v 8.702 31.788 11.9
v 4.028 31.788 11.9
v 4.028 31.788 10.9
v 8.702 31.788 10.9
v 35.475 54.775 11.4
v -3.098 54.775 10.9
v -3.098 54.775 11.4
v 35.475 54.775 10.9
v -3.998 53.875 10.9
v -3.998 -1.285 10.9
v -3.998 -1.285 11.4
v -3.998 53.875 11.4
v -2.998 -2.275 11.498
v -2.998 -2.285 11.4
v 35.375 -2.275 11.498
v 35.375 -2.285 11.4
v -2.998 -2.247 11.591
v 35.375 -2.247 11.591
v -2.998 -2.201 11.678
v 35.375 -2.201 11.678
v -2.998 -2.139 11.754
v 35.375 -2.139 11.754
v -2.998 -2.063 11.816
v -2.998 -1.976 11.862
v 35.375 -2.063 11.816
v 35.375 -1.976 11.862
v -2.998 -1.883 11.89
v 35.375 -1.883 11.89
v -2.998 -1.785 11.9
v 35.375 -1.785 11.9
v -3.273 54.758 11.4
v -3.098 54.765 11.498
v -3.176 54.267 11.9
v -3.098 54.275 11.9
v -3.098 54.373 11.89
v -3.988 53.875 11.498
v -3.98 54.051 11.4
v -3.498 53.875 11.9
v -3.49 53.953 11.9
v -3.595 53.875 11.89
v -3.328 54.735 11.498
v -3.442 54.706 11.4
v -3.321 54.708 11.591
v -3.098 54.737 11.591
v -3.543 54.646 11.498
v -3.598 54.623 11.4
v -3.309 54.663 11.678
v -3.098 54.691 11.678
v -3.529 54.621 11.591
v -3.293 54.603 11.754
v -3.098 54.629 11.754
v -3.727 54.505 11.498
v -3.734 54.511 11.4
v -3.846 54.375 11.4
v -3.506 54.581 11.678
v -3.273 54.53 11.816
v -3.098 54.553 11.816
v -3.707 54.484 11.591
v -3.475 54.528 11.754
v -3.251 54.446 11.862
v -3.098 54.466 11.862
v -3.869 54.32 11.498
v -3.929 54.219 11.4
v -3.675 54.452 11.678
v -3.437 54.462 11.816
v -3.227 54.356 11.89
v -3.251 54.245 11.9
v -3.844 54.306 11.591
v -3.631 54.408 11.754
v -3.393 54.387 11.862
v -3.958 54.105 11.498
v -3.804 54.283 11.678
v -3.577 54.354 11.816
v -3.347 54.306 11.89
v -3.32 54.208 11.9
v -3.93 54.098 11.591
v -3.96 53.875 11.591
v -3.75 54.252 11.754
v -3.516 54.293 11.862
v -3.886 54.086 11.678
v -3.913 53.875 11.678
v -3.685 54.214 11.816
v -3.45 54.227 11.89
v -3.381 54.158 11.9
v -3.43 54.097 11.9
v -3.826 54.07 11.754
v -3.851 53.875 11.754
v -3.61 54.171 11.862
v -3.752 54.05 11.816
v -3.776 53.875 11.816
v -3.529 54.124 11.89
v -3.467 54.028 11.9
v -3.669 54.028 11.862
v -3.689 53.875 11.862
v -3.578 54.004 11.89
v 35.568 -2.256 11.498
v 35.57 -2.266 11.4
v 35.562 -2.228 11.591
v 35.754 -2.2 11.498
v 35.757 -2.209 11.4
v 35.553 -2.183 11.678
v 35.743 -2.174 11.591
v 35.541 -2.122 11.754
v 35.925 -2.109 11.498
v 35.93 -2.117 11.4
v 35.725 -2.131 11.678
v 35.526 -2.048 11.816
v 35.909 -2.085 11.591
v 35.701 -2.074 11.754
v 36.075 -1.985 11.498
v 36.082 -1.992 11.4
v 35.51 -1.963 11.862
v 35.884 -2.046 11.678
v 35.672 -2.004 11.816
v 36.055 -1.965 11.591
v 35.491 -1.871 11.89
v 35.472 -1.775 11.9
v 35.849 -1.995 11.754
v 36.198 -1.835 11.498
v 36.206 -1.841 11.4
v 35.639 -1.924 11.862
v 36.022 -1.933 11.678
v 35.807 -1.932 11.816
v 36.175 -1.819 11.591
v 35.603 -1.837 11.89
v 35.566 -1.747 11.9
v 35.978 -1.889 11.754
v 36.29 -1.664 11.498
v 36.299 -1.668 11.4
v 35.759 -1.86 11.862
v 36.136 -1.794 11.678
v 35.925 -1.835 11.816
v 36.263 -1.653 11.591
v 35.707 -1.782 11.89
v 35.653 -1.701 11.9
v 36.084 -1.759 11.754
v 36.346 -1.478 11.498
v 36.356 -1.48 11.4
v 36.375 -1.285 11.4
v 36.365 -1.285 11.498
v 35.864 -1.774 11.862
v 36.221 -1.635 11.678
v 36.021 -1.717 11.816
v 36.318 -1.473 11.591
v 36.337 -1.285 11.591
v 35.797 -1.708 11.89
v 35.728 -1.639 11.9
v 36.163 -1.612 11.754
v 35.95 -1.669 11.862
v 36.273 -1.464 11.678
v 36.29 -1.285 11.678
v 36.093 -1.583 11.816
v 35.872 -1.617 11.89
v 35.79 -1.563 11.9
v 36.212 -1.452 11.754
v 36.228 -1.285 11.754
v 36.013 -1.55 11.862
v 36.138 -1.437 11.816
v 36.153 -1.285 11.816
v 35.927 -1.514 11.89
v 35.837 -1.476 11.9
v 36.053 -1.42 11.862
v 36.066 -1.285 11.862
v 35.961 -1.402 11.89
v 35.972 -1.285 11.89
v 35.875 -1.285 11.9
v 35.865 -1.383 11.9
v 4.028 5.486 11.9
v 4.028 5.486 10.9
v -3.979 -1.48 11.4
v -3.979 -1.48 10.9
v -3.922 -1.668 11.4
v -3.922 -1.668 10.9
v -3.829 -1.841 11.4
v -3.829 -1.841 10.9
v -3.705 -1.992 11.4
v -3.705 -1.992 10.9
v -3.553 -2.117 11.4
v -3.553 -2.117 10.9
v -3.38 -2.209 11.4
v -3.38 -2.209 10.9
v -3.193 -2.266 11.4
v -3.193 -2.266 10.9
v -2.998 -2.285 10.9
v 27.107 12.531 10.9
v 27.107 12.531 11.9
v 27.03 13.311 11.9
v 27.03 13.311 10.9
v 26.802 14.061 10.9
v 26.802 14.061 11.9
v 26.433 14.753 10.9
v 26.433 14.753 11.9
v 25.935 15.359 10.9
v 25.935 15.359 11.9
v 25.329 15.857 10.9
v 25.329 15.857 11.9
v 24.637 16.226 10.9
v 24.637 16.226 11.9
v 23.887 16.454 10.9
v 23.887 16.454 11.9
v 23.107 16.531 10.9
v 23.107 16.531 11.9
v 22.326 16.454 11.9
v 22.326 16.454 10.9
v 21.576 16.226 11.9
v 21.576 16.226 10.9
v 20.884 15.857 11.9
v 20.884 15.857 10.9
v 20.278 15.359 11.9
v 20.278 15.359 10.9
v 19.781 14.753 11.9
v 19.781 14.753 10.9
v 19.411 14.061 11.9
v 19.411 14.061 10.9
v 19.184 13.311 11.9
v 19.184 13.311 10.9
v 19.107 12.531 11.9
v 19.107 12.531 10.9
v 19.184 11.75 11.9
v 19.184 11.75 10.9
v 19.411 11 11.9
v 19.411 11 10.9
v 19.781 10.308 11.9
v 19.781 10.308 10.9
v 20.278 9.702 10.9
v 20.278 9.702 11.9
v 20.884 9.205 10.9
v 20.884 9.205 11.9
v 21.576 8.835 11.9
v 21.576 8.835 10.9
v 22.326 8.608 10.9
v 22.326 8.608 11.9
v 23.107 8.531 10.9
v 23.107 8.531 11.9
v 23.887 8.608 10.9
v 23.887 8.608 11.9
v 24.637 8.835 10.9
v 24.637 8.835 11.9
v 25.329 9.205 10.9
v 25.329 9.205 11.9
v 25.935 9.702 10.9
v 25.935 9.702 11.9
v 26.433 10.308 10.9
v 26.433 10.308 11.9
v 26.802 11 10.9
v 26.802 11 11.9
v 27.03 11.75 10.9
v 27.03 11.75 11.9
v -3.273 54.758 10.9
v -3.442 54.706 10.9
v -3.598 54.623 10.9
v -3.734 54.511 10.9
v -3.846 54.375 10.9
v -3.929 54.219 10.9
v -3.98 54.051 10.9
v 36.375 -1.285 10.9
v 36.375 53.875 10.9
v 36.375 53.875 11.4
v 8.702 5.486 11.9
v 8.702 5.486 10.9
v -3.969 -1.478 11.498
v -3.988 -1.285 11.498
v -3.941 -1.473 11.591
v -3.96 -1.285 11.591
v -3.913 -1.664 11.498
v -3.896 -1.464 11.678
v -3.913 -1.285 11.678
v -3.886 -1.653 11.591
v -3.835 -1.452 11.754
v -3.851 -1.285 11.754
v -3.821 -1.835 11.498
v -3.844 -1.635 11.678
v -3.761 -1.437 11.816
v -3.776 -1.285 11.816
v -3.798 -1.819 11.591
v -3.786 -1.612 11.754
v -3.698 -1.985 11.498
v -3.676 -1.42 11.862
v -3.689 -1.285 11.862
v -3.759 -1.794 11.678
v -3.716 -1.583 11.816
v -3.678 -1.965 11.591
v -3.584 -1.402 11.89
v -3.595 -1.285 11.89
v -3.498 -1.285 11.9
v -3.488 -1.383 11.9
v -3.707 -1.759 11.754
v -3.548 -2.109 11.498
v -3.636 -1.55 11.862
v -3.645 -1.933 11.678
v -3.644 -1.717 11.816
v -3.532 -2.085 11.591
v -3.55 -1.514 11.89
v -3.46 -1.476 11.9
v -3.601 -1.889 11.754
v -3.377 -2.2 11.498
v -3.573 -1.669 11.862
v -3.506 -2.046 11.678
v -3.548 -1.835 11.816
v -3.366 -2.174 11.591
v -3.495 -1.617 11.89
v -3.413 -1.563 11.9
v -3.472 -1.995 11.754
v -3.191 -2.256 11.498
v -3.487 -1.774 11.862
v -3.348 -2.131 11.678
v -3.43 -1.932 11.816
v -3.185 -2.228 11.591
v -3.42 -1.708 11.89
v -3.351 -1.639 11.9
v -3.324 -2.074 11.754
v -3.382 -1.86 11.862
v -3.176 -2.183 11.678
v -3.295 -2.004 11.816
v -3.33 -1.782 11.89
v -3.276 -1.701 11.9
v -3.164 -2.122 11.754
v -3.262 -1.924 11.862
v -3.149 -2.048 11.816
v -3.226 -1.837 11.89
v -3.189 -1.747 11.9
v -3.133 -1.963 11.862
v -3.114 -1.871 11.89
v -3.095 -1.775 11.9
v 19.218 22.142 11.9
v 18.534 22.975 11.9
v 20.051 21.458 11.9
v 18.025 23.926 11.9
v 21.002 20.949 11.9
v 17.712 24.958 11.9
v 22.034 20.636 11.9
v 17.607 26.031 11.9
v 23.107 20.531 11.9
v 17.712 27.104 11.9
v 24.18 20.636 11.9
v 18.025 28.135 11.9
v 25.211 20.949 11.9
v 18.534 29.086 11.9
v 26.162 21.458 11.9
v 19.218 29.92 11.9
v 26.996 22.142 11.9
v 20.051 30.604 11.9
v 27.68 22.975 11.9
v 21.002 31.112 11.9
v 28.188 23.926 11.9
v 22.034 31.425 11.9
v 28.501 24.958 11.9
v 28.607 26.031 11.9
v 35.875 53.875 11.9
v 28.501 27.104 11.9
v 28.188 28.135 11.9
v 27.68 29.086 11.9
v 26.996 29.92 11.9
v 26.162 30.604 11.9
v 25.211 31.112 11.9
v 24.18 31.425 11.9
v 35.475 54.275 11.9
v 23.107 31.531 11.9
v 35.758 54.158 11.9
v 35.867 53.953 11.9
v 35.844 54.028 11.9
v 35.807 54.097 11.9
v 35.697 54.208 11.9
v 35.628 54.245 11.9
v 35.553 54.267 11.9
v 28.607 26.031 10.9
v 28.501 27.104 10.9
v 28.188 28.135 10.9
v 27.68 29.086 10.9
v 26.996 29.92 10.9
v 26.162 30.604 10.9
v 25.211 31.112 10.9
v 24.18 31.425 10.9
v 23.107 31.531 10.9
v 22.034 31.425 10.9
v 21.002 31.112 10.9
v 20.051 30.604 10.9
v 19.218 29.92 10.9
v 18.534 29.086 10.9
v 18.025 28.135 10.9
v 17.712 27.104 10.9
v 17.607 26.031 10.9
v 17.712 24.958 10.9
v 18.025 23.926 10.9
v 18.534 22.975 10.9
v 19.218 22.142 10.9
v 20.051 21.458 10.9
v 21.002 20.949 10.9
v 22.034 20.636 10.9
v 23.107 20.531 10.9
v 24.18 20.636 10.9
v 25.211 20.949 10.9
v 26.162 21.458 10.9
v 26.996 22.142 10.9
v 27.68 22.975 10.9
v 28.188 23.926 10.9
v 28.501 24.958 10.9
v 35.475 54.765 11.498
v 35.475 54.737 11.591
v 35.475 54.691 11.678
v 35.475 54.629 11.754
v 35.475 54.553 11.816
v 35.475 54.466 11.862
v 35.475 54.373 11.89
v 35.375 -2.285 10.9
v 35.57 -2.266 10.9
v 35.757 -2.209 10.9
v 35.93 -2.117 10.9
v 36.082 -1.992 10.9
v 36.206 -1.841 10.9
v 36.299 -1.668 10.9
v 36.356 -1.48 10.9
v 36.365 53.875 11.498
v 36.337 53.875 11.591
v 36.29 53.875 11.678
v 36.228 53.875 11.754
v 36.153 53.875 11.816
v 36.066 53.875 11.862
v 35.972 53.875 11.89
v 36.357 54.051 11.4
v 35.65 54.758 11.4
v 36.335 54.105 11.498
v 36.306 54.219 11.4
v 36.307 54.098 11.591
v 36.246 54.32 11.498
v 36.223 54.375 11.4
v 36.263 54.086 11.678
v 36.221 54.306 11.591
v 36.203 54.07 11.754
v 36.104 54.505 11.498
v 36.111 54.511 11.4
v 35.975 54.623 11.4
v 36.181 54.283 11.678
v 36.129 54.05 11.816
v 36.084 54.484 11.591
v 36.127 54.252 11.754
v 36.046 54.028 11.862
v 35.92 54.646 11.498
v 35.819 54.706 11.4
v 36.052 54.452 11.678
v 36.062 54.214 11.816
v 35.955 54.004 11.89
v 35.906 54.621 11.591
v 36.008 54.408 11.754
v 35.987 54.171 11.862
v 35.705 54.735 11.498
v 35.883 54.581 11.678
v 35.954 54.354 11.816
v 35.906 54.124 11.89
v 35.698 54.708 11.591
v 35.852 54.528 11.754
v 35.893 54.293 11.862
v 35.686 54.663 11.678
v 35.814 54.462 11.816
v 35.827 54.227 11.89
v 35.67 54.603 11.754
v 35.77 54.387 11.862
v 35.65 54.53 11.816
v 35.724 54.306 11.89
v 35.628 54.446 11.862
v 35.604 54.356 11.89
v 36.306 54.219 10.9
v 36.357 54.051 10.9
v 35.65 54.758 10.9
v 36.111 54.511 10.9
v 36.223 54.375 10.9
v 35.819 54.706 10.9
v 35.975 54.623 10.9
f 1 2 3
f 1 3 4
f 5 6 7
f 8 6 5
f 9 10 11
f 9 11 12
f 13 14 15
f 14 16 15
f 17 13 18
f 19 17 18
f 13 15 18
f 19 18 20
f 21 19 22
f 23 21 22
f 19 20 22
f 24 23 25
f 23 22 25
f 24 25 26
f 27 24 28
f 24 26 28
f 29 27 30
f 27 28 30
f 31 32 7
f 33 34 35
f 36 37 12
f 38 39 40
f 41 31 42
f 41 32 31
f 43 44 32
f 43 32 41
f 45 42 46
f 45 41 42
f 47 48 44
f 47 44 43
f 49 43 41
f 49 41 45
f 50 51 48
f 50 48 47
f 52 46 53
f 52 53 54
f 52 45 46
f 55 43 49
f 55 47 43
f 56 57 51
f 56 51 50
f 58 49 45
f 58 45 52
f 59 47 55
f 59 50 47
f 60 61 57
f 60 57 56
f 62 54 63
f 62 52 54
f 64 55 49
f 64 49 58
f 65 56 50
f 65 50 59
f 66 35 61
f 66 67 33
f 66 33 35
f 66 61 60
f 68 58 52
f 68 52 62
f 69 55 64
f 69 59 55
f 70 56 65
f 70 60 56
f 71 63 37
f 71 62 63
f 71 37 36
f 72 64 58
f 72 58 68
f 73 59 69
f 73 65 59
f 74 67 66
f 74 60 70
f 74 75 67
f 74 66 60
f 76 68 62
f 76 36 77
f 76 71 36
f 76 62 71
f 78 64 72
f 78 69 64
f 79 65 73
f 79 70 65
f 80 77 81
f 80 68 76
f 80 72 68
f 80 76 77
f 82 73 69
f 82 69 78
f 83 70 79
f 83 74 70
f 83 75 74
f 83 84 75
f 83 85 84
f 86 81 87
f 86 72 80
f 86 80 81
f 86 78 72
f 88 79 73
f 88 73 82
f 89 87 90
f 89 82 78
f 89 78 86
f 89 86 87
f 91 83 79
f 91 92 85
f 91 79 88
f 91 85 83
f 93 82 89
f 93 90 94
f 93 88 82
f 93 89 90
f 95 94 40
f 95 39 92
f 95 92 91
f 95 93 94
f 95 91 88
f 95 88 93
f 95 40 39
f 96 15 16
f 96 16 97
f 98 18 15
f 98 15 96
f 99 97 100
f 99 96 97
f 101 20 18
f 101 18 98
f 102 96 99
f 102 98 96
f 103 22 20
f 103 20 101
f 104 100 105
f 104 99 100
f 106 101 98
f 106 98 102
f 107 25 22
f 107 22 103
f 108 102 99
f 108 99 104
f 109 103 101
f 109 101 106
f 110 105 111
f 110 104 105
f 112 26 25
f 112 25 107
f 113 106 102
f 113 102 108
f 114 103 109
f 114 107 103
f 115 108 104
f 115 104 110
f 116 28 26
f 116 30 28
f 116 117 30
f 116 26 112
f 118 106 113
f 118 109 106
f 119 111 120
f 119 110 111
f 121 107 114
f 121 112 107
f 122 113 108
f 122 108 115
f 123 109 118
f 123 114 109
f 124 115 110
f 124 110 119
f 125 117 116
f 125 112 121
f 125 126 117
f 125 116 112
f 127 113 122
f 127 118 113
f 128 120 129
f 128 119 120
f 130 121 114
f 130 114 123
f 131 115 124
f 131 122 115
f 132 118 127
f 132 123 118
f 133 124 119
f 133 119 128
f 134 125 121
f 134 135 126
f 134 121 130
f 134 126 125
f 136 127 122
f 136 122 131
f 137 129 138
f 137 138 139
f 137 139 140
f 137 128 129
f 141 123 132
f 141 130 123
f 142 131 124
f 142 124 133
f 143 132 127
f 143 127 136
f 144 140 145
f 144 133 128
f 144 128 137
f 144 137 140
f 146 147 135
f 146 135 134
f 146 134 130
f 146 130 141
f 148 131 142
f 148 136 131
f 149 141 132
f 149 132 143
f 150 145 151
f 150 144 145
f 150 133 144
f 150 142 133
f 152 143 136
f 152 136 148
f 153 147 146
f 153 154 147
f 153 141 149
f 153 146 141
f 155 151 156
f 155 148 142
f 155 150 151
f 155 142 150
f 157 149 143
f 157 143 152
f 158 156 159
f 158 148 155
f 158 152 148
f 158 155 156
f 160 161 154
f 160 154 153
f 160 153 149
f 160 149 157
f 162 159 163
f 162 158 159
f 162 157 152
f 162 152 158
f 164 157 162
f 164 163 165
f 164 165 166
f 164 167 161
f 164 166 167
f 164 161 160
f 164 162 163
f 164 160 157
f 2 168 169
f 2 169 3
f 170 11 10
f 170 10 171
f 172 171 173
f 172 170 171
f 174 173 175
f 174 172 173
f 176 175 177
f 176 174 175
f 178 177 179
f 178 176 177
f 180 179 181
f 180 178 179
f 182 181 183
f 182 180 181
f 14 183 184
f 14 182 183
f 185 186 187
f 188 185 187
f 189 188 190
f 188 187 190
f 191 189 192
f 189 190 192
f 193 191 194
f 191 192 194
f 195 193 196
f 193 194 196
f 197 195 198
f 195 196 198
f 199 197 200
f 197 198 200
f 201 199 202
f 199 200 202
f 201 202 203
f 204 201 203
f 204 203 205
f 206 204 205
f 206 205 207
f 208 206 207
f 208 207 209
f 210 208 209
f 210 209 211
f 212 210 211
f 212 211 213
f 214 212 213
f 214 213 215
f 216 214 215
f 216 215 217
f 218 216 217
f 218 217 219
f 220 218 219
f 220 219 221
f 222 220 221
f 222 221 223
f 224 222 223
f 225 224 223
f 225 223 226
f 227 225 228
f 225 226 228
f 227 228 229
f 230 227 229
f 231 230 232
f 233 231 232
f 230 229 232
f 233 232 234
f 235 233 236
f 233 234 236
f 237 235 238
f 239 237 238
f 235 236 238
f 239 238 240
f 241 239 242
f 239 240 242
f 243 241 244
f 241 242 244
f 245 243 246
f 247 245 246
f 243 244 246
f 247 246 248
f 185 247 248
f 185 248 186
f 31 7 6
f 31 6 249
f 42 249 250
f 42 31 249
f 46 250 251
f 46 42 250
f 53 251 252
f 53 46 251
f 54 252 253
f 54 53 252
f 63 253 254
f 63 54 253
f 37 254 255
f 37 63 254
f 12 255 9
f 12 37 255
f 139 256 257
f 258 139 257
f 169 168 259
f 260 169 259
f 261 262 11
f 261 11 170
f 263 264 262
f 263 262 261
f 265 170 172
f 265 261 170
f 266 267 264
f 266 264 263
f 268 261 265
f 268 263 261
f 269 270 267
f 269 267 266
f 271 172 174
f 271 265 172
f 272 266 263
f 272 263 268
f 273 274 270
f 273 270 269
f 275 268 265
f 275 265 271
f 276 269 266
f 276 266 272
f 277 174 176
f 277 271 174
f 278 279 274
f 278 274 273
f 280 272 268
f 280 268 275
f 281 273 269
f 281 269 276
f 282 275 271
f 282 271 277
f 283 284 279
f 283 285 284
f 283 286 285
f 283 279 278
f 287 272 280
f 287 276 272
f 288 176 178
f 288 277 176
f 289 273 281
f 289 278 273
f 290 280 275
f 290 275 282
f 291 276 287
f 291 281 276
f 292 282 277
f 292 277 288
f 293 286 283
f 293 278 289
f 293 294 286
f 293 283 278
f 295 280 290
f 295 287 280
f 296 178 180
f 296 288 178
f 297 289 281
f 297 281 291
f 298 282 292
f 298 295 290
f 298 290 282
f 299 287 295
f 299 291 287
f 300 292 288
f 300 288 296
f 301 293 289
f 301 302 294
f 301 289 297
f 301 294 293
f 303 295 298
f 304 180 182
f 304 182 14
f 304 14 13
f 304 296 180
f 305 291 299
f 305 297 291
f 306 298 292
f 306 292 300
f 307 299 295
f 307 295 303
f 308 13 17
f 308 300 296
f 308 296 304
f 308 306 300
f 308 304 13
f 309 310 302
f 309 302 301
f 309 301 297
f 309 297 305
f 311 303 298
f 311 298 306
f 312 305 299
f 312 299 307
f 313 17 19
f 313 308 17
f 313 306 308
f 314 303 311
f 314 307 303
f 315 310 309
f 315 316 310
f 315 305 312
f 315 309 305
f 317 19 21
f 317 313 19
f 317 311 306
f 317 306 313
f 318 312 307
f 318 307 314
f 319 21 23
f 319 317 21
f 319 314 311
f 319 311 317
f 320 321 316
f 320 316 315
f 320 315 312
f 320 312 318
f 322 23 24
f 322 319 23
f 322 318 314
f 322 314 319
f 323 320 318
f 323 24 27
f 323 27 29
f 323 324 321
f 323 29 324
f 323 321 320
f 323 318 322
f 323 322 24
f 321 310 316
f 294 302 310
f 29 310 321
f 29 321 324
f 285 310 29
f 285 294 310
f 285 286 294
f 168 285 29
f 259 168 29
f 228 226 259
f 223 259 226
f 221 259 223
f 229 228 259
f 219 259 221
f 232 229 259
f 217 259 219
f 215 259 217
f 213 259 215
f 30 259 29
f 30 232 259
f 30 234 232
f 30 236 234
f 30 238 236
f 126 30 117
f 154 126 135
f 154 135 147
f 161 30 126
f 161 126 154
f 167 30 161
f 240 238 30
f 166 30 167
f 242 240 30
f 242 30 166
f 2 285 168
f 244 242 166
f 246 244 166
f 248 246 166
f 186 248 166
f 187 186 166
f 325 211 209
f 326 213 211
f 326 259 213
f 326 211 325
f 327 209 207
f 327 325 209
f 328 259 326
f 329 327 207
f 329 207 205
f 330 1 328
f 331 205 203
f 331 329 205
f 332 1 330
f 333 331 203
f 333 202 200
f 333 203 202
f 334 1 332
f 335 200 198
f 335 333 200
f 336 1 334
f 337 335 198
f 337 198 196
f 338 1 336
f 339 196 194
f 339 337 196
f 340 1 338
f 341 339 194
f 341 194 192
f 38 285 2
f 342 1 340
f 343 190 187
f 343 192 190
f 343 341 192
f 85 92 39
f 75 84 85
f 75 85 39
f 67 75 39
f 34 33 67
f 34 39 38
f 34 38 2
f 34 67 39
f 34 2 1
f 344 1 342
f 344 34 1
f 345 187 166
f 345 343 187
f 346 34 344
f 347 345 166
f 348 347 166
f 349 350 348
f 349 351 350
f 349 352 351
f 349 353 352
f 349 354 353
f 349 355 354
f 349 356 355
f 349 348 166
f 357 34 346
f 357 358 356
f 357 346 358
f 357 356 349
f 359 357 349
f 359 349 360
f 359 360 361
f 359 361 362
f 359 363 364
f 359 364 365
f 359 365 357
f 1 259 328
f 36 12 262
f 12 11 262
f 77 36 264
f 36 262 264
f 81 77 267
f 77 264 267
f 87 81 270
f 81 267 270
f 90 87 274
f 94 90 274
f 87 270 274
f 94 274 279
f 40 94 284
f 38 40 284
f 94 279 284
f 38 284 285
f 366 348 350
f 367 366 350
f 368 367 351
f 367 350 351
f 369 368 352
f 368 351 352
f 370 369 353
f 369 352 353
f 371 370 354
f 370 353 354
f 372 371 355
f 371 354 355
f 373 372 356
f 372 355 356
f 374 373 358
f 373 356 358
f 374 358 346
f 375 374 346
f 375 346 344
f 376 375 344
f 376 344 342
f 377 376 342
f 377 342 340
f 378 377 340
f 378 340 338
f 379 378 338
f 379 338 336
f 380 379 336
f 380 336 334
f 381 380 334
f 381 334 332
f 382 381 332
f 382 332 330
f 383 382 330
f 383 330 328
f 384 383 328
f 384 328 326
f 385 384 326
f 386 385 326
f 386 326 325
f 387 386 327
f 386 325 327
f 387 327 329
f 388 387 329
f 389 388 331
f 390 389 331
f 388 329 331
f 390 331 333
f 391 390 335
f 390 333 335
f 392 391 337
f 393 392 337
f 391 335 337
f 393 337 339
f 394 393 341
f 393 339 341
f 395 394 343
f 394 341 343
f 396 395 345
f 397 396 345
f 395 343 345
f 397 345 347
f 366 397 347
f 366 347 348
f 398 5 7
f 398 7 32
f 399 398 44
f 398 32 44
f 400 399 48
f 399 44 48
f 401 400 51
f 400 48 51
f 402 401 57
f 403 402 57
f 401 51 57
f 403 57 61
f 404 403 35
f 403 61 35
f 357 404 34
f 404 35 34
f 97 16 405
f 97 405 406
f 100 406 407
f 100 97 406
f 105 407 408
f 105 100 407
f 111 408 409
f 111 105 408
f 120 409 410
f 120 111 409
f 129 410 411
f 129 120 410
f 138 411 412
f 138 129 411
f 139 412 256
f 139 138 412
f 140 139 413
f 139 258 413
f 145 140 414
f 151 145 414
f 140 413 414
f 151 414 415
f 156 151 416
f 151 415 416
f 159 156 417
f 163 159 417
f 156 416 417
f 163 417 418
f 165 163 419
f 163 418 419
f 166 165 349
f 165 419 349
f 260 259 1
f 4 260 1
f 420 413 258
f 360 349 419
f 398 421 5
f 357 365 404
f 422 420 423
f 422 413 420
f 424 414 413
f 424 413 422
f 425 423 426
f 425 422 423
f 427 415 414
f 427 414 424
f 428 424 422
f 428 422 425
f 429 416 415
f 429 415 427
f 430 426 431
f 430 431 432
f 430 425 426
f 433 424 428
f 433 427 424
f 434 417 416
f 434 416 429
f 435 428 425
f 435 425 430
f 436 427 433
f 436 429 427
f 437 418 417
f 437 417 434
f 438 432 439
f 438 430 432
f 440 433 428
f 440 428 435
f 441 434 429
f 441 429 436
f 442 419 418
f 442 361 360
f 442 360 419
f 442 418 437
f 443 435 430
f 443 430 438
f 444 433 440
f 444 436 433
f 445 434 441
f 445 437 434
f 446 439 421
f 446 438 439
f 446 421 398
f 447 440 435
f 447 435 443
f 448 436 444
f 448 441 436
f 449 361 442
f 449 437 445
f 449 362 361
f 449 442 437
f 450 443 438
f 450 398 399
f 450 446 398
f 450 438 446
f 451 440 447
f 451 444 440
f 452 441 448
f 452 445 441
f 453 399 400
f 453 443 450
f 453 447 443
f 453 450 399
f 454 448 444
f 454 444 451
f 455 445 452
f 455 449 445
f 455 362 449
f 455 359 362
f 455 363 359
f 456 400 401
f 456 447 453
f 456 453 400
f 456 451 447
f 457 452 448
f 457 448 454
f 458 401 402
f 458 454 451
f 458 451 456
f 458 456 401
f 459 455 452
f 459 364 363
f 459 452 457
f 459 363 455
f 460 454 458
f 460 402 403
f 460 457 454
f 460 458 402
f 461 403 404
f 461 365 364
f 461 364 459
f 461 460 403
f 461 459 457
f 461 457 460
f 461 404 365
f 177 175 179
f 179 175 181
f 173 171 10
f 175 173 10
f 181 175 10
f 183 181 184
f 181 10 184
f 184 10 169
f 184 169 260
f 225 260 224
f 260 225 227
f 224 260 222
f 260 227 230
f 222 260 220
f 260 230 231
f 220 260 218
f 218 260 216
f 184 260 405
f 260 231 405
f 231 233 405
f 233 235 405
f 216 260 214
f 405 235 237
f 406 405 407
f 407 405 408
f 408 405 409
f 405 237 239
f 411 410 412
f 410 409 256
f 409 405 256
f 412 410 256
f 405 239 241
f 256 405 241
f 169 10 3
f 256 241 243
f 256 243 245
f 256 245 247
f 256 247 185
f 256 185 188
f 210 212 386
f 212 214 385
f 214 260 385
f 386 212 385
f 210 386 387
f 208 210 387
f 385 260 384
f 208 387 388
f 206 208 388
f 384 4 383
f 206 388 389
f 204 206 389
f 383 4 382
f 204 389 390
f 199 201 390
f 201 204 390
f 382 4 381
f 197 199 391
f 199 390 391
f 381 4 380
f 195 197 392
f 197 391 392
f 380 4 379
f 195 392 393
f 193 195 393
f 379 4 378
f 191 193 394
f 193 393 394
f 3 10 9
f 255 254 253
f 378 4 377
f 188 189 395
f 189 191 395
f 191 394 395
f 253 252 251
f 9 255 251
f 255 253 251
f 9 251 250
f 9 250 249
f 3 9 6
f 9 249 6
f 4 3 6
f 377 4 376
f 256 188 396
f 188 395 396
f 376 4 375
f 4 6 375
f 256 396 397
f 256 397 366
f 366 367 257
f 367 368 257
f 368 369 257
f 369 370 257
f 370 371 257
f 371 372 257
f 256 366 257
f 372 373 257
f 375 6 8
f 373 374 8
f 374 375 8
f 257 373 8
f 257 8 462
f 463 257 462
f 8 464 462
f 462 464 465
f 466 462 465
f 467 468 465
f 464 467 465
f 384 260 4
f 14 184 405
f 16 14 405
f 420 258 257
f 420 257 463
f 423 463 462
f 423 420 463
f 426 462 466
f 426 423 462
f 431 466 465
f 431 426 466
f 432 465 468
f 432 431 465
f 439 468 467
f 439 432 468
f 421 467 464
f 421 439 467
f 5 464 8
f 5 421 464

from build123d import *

# Parameters (mm, degrees)
SKETCH009_W     = 40.3725
SKETCH009_H     = 57.06
PAD005_DEPTH    = 1
SKETCH010_R     = 5.5
SKETCH010_R_2   = 4
SKETCH010_W     = 4.674176
SKETCH010_H     = 26.302142
POCKET003_DEPTH = 2
FILLET009_R     = 1
FILLET010_R     = 1
FILLET011_R     = 0.9
FILLET012_R     = 0.9
FILLET013_R     = 0.5


with BuildPart() as part:
    # Sketch009 → Pad005 (new body)
    with BuildSketch(Plane.XY.offset(10.9)):
        with Locations((16.18851, 26.244964)):
            Rectangle(SKETCH009_W, SKETCH009_H)
    extrude(amount=PAD005_DEPTH)

    # Sketch010 → Pocket003 (cut)
    with BuildSketch(Plane.XY.offset(11.9)):
        with Locations((23.106682, 26.030702)):
            Circle(SKETCH010_R)
        with Locations((23.106682, 12.530702)):
            Circle(SKETCH010_R_2)
        with Locations((6.364725, 18.636953)):
            Rectangle(SKETCH010_W, SKETCH010_H)
    extrude(amount=-POCKET003_DEPTH, mode=Mode.SUBTRACT)

    # Fillet009
    fillet009_edges = [part.edges().sort_by_distance(p)[0] for p in [
        (-3.99774, -2.285036, 11.4),
    ]]
    fillet(fillet009_edges, radius=FILLET009_R)

    # Fillet010
    fillet010_edges = [part.edges().sort_by_distance(p)[0] for p in [
        (36.37476, -2.285036, 11.4),
    ]]
    fillet(fillet010_edges, radius=FILLET010_R)

    # Fillet011
    fillet011_edges = [part.edges().sort_by_distance(p)[0] for p in [
        (36.37476, 54.774964, 11.4),
    ]]
    fillet(fillet011_edges, radius=FILLET011_R)

    # Fillet012
    fillet012_edges = [part.edges().sort_by_distance(p)[0] for p in [
        (-3.99774, 54.774964, 11.4),
    ]]
    fillet(fillet012_edges, radius=FILLET012_R)

    # Fillet013
    fillet013_edges = [part.edges().sort_by_distance(p)[0] for p in [
        (36.37476, 26.294964, 11.9),
    ]]
    fillet(fillet013_edges, radius=FILLET013_R)


solid = part.part
